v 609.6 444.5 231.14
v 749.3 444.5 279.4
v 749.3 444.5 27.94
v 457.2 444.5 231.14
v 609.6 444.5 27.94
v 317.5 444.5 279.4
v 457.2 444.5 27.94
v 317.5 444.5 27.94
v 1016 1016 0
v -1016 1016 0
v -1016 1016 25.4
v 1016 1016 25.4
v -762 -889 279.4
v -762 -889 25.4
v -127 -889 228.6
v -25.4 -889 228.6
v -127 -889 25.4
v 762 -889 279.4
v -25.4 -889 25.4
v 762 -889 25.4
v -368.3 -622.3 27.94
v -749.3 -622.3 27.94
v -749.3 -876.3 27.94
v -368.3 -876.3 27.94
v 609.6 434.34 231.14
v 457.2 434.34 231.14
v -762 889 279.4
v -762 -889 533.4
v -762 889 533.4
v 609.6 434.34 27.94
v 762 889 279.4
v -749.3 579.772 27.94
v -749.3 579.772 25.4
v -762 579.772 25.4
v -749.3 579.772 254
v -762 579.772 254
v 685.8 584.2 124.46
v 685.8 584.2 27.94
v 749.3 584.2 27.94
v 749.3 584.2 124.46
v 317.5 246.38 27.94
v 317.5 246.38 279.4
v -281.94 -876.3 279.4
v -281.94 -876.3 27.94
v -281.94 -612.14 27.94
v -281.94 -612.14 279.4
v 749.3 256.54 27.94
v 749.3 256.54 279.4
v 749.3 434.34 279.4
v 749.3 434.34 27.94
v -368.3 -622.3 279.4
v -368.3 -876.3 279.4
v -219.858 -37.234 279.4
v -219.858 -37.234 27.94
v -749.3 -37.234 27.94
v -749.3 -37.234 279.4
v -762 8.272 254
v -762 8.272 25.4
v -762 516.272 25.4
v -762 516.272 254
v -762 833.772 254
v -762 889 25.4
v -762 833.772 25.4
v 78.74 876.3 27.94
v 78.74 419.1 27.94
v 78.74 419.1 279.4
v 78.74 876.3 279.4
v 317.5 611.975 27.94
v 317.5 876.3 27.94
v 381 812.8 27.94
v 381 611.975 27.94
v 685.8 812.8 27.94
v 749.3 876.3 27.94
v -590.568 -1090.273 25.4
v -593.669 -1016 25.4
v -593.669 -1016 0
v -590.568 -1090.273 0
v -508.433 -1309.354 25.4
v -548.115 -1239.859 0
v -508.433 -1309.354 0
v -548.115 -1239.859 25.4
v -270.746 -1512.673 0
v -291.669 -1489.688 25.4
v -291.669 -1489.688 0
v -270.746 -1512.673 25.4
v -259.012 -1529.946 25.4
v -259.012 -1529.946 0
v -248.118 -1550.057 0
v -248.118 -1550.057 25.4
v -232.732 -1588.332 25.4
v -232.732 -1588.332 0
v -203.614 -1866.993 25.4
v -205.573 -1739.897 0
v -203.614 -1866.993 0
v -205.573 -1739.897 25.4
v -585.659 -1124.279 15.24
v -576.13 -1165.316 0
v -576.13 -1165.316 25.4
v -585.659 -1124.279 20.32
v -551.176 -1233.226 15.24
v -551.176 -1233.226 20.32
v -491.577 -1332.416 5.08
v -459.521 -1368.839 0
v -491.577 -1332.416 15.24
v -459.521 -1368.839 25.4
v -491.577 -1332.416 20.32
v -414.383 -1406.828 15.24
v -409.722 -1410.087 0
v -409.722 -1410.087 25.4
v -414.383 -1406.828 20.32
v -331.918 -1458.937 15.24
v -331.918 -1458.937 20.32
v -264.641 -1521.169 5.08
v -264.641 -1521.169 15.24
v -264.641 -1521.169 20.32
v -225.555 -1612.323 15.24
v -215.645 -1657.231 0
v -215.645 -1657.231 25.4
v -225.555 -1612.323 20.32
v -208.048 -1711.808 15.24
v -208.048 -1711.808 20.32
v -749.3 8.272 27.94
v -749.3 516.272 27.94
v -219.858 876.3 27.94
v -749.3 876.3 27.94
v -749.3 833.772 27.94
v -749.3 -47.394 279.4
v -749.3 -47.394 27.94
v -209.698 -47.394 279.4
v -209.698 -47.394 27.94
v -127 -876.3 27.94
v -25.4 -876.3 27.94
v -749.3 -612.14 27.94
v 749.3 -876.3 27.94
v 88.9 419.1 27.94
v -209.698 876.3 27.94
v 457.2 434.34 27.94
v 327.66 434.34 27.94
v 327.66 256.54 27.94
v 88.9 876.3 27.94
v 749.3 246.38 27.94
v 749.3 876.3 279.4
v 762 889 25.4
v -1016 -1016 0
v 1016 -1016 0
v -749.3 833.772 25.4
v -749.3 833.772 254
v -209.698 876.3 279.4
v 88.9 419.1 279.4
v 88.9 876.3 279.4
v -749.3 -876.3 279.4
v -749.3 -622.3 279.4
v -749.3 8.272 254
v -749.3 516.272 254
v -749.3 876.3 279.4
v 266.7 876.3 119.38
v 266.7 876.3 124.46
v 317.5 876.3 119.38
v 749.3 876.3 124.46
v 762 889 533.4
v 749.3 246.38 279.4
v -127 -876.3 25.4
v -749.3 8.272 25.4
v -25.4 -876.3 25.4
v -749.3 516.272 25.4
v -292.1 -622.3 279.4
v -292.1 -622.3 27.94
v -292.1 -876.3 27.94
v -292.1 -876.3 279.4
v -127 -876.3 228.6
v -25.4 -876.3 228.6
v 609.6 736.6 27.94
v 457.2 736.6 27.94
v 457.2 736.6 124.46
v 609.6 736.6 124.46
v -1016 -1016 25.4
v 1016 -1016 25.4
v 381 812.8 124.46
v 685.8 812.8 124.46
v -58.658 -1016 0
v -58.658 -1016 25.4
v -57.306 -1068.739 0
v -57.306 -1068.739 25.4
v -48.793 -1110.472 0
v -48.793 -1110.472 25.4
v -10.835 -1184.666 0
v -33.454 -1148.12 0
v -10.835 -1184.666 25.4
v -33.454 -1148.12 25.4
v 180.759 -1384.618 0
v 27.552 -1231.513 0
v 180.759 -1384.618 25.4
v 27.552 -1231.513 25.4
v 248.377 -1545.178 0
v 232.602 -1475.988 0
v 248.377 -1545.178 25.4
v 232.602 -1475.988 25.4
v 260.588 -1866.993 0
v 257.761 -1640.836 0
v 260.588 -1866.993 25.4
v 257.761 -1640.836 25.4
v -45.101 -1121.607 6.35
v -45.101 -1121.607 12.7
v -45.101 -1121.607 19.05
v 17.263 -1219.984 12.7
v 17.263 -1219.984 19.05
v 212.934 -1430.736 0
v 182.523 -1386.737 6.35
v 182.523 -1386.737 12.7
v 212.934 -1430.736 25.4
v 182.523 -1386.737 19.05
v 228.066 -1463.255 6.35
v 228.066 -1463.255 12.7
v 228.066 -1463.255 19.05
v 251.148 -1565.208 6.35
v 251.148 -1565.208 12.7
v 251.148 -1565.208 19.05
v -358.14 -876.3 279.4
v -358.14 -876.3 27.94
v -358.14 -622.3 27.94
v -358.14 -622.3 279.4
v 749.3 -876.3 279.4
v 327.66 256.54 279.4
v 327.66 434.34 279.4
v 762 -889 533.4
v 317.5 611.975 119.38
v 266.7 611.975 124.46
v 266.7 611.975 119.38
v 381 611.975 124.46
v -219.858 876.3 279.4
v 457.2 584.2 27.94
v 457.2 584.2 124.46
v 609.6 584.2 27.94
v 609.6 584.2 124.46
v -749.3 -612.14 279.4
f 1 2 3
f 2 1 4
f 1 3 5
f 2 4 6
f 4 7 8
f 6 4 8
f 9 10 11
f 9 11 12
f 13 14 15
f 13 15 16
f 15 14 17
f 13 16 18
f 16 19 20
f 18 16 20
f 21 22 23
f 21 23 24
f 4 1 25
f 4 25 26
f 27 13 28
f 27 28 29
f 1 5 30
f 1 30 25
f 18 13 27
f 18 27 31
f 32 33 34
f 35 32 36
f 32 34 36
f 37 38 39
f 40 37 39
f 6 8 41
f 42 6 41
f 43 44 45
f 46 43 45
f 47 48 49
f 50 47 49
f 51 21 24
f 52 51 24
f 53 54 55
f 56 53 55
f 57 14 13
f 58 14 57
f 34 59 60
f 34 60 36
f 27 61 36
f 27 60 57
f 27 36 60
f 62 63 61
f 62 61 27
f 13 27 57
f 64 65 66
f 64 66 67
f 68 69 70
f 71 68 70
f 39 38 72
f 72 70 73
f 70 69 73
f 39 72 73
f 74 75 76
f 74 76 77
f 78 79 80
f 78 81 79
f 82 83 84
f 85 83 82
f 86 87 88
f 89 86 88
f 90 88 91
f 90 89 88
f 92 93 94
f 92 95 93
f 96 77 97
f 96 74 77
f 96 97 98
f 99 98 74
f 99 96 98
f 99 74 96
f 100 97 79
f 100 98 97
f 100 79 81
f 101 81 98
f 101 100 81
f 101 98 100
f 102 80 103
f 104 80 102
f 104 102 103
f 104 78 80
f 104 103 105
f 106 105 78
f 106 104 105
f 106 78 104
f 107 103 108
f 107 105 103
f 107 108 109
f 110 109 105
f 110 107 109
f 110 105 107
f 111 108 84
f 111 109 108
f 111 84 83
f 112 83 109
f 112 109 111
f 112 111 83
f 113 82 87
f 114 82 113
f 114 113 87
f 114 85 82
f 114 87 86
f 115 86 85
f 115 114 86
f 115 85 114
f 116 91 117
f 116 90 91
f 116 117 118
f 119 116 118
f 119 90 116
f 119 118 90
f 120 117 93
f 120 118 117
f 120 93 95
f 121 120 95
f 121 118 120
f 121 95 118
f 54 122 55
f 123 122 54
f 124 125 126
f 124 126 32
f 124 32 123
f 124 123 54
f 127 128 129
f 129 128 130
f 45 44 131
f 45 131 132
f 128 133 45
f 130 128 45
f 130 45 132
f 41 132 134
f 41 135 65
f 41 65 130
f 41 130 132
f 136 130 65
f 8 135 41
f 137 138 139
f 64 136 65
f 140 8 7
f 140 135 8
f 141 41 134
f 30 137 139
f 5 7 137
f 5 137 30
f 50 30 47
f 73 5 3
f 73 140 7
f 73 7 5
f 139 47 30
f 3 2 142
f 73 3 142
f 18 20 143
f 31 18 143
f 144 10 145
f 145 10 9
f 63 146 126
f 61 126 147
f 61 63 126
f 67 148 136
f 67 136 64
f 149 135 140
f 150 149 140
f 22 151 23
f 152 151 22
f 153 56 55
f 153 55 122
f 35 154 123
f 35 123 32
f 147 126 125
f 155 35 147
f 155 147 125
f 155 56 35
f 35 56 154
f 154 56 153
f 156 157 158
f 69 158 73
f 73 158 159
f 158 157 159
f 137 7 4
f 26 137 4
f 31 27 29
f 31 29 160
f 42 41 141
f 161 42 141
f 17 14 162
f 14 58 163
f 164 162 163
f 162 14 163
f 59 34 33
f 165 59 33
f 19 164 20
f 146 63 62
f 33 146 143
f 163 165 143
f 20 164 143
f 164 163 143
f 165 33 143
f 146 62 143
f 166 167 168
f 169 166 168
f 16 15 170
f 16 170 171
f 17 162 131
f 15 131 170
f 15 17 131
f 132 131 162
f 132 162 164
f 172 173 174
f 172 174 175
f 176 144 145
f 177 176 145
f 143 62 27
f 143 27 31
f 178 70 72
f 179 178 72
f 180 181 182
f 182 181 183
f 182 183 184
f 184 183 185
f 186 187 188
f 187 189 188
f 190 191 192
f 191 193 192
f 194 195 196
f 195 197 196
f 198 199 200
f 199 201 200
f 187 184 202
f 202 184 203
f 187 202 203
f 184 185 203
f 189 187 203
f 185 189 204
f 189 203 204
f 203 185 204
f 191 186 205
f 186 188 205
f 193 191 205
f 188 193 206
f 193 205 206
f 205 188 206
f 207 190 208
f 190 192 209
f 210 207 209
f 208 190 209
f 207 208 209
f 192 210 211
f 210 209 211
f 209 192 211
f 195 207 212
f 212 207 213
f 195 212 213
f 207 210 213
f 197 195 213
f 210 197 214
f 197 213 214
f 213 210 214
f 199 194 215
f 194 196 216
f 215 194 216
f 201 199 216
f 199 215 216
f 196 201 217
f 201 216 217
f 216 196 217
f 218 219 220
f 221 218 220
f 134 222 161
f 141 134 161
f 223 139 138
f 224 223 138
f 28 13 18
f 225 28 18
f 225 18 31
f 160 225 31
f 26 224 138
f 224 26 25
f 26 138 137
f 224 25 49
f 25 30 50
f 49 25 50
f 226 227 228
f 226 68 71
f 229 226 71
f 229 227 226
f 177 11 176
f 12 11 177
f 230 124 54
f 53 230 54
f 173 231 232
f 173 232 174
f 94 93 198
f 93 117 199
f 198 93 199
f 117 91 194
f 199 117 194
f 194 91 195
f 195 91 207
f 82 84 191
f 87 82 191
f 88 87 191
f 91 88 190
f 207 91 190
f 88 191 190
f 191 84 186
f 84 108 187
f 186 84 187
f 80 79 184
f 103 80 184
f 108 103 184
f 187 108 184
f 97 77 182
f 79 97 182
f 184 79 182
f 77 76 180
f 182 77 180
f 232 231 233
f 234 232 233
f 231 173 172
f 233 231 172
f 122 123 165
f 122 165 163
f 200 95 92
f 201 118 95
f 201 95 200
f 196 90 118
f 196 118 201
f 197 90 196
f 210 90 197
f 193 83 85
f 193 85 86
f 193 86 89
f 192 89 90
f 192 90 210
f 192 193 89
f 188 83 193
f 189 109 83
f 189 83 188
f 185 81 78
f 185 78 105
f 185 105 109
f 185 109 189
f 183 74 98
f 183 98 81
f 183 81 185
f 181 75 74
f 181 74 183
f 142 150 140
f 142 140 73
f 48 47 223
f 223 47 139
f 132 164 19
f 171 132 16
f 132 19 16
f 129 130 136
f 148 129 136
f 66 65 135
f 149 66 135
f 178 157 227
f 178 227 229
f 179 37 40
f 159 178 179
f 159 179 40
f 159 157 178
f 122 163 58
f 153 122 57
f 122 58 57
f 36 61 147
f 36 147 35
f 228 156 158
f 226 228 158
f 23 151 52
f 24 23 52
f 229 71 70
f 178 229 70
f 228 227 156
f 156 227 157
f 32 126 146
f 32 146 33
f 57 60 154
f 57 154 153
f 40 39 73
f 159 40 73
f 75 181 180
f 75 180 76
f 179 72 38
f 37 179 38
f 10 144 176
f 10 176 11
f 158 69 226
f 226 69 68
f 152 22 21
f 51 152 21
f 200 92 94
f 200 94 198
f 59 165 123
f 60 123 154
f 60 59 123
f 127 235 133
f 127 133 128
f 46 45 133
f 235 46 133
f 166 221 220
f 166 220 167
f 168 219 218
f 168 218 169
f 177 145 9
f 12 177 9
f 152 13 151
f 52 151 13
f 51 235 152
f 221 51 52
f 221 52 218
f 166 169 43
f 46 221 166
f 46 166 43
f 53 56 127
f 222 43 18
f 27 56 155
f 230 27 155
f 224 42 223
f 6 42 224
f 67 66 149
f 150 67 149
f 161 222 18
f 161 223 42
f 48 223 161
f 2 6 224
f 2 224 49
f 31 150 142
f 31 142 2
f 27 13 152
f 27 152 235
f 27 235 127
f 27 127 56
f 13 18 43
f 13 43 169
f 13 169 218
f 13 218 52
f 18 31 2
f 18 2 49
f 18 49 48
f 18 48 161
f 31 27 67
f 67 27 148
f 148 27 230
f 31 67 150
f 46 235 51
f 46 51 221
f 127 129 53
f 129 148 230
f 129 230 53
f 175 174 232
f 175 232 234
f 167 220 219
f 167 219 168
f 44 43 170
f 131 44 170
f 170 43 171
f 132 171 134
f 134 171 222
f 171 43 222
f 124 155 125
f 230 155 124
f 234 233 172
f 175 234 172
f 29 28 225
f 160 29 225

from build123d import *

# Parameters (mm, degrees)
F0_W      = 2032
F0_H      = 2032
F1_DEPTH  = 25.4
F2_W      = 1524
F2_H      = 1778
F3_DEPTH  = 254
F4_W      = 1524
F4_H      = 1778
F5_DEPTH  = 254
F6_W      = 1498.6
F6_H      = 1752.6
F7_DEPTH  = 251.46
F9_DEPTH  = 25.4
F10_W     = 254
F10_H     = 228.6
F10_W_2   = 508
F11_DEPTH = 12.7
F12_W     = 10.16
F12_H     = 457.2
F13_DEPTH = 251.46
F14_W     = 101.6
F14_H     = 203.2
F15_DEPTH = 12.7
F16_W     = 152.4
F16_H     = 152.4
F17_DEPTH = 96.52
F18_W     = 50.8
F18_H     = 264.3253242493
F19_DEPTH = 5.08
F20_W     = 152.4
F20_H     = 203.2
F21_DEPTH = 25.4


with BuildPart() as f1:
    # F0 (on Top) → F1 (new body)
    with BuildSketch(Plane.XY):
        Rectangle(F0_W, F0_H)
    extrude(amount=F1_DEPTH)


with BuildPart() as f3:
    # F2 (on face) → F3 (new body)
    with BuildSketch(Plane.XY.offset(25.4)):
        Rectangle(F2_W, F2_H)
    extrude(amount=F3_DEPTH)

    # F6 (on face) → F7 (cut)
    with BuildSketch(Plane.XY.offset(279.4)):
        Rectangle(F6_W, F6_H)
    extrude(amount=-F7_DEPTH, mode=Mode.SUBTRACT)

    # F10 (on face) → F11 (cut, through all)
    with BuildSketch(Plane(origin=(-762, 0, 0), x_dir=(0, -1, 0), z_dir=(-1, 0, 0))):
        with Locations((-706.7724208832, 139.7)):
            Rectangle(F10_W, F10_H)
        with Locations((-262.2724208832, 139.7)):
            Rectangle(F10_W_2, F10_H)
    extrude(amount=-F11_DEPTH, mode=Mode.SUBTRACT)

    # F12 (on face) → F13 (join, through all)
    with BuildSketch(Plane.XY.offset(27.94)):
        Polygon((-749.3, -37.2344880068), (-749.3, -47.3944880068), (-219.8577076197, -47.3944880068), (-209.6977076197, -47.3944880068), (-209.6977076197, -37.2344880068), (-209.6977076197, 876.3), (-219.8577076197, 876.3), (-219.8577076197, -37.2344880068), align=None)
        Polygon((-368.3, -612.14), (-749.3, -612.14), (-749.3, -622.3), (-368.3, -622.3), (-368.3, -876.3), (-358.14, -876.3), (-358.14, -622.3), (-292.1, -622.3), (-292.1, -876.3), (-281.94, -876.3), (-281.94, -622.3), (-281.94, -612.14), (-358.14, -612.14), align=None)
        with Locations((83.82, 647.7)):
            Rectangle(F12_W, F12_H)
        Polygon((749.3, 434.34), (749.3, 444.5), (520.7, 444.5), (317.5, 444.5), (317.5, 434.34), (317.5, 256.54), (317.5, 246.38), (749.3, 246.38), (749.3, 256.54), (520.7, 256.54), (327.66, 256.54), (327.66, 434.34), align=None)
    extrude(amount=F13_DEPTH)

    # F14 (on face) → F15 (cut, through all)
    with BuildSketch(Plane.XZ.offset(889)):
        with Locations((-76.2, 127)):
            Rectangle(F14_W, F14_H)
    extrude(amount=-F15_DEPTH, mode=Mode.SUBTRACT)

    # F20 (on face) → F21 (cut)
    with BuildSketch(Plane(origin=(0, 444.5, 0), x_dir=(-1, 0, 0), z_dir=(0, 1, 0))):
        with Locations((-533.4, 129.54)):
            Rectangle(F20_W, F20_H)
    extrude(amount=-F21_DEPTH, mode=Mode.SUBTRACT)


with BuildPart() as f5:
    # F4 (on face) → F5 (new body)
    with BuildSketch(Plane.XY.offset(279.4)):
        Rectangle(F4_W, F4_H)
    extrude(amount=F5_DEPTH)


with BuildPart() as f9:
    # F8 (on face) → F9 (new body)
    with BuildSketch(Plane.XY.offset(25.4)):
        with BuildLine():
            Line((-58.6583714405, -1016), (-593.6688348535, -1016))
            add(Edge.make_bspline(
                [(-593.6688348535, -1016), (-594.360714053, -1059.8867295439), (-585.0651189783, -1193.5239520487), (-459.1190670382, -1411.2646677711), (-248.2419739751, -1479.02246379), (-200.9736880033, -1713.6169998853), (-202.7823744553, -1818.6935418855), (-203.6137580872, -1866.9931888575)],
                knots=[0.1054044545, 0.1054044545, 0.1054044545, 0.1054044545, 0.2164959633, 0.4417006838, 0.6340784465, 0.8317999287, 1, 1, 1, 1], degree=3))
            Line((-203.6137580872, -1866.9931888575), (260.5878098599, -1866.9931888575))
            add(Edge.make_bspline(
                [(-58.6583714405, -1016), (-60.7820202944, -1056.9303276014), (-47.1032761734, -1186.1559578726), (176.8589632329, -1357.376931496), (259.2956250273, -1502.740133951), (262.6071849495, -1730.8381945239), (260.5878098599, -1866.9931888575)],
                knots=[0.1137988437, 0.1137988437, 0.1137988437, 0.1137988437, 0.2276232253, 0.4807491539, 0.6765731599, 0.9158436382, 0.9158436382, 0.9158436382, 0.9158436382], degree=3))
        make_face()
    extrude(amount=-F9_DEPTH)


with BuildPart() as f17:
    # F16 (on face) → F17 (new body)
    with BuildSketch(Plane.XY.offset(27.94)):
        with Locations((533.4, 660.4)):
            Rectangle(F16_W, F16_H)
    extrude(amount=F17_DEPTH)


with BuildPart() as f17b:
    # F16 (on face) → F17, piece 2 (new body)
    with BuildSketch(Plane.XY.offset(27.94)):
        Polygon((749.3, 812.8), (749.3, 876.3), (685.8, 876.3), (317.5, 876.3), (317.5, 812.8), (317.5, 611.9746757507), (381, 611.9746757507), (381, 812.8), (685.8, 812.8), (685.8, 584.2), (749.3, 584.2), align=None)
    extrude(amount=F17_DEPTH)

    # F18 (on face) → F19 (join)
    with BuildSketch(Plane.XY.offset(124.46)):
        with Locations((292.1, 744.1373378754)):
            Rectangle(F18_W, F18_H)
    extrude(amount=-F19_DEPTH)


solid = Compound([f1.part, f3.part, f5.part, f9.part, f17.part, f17b.part])
